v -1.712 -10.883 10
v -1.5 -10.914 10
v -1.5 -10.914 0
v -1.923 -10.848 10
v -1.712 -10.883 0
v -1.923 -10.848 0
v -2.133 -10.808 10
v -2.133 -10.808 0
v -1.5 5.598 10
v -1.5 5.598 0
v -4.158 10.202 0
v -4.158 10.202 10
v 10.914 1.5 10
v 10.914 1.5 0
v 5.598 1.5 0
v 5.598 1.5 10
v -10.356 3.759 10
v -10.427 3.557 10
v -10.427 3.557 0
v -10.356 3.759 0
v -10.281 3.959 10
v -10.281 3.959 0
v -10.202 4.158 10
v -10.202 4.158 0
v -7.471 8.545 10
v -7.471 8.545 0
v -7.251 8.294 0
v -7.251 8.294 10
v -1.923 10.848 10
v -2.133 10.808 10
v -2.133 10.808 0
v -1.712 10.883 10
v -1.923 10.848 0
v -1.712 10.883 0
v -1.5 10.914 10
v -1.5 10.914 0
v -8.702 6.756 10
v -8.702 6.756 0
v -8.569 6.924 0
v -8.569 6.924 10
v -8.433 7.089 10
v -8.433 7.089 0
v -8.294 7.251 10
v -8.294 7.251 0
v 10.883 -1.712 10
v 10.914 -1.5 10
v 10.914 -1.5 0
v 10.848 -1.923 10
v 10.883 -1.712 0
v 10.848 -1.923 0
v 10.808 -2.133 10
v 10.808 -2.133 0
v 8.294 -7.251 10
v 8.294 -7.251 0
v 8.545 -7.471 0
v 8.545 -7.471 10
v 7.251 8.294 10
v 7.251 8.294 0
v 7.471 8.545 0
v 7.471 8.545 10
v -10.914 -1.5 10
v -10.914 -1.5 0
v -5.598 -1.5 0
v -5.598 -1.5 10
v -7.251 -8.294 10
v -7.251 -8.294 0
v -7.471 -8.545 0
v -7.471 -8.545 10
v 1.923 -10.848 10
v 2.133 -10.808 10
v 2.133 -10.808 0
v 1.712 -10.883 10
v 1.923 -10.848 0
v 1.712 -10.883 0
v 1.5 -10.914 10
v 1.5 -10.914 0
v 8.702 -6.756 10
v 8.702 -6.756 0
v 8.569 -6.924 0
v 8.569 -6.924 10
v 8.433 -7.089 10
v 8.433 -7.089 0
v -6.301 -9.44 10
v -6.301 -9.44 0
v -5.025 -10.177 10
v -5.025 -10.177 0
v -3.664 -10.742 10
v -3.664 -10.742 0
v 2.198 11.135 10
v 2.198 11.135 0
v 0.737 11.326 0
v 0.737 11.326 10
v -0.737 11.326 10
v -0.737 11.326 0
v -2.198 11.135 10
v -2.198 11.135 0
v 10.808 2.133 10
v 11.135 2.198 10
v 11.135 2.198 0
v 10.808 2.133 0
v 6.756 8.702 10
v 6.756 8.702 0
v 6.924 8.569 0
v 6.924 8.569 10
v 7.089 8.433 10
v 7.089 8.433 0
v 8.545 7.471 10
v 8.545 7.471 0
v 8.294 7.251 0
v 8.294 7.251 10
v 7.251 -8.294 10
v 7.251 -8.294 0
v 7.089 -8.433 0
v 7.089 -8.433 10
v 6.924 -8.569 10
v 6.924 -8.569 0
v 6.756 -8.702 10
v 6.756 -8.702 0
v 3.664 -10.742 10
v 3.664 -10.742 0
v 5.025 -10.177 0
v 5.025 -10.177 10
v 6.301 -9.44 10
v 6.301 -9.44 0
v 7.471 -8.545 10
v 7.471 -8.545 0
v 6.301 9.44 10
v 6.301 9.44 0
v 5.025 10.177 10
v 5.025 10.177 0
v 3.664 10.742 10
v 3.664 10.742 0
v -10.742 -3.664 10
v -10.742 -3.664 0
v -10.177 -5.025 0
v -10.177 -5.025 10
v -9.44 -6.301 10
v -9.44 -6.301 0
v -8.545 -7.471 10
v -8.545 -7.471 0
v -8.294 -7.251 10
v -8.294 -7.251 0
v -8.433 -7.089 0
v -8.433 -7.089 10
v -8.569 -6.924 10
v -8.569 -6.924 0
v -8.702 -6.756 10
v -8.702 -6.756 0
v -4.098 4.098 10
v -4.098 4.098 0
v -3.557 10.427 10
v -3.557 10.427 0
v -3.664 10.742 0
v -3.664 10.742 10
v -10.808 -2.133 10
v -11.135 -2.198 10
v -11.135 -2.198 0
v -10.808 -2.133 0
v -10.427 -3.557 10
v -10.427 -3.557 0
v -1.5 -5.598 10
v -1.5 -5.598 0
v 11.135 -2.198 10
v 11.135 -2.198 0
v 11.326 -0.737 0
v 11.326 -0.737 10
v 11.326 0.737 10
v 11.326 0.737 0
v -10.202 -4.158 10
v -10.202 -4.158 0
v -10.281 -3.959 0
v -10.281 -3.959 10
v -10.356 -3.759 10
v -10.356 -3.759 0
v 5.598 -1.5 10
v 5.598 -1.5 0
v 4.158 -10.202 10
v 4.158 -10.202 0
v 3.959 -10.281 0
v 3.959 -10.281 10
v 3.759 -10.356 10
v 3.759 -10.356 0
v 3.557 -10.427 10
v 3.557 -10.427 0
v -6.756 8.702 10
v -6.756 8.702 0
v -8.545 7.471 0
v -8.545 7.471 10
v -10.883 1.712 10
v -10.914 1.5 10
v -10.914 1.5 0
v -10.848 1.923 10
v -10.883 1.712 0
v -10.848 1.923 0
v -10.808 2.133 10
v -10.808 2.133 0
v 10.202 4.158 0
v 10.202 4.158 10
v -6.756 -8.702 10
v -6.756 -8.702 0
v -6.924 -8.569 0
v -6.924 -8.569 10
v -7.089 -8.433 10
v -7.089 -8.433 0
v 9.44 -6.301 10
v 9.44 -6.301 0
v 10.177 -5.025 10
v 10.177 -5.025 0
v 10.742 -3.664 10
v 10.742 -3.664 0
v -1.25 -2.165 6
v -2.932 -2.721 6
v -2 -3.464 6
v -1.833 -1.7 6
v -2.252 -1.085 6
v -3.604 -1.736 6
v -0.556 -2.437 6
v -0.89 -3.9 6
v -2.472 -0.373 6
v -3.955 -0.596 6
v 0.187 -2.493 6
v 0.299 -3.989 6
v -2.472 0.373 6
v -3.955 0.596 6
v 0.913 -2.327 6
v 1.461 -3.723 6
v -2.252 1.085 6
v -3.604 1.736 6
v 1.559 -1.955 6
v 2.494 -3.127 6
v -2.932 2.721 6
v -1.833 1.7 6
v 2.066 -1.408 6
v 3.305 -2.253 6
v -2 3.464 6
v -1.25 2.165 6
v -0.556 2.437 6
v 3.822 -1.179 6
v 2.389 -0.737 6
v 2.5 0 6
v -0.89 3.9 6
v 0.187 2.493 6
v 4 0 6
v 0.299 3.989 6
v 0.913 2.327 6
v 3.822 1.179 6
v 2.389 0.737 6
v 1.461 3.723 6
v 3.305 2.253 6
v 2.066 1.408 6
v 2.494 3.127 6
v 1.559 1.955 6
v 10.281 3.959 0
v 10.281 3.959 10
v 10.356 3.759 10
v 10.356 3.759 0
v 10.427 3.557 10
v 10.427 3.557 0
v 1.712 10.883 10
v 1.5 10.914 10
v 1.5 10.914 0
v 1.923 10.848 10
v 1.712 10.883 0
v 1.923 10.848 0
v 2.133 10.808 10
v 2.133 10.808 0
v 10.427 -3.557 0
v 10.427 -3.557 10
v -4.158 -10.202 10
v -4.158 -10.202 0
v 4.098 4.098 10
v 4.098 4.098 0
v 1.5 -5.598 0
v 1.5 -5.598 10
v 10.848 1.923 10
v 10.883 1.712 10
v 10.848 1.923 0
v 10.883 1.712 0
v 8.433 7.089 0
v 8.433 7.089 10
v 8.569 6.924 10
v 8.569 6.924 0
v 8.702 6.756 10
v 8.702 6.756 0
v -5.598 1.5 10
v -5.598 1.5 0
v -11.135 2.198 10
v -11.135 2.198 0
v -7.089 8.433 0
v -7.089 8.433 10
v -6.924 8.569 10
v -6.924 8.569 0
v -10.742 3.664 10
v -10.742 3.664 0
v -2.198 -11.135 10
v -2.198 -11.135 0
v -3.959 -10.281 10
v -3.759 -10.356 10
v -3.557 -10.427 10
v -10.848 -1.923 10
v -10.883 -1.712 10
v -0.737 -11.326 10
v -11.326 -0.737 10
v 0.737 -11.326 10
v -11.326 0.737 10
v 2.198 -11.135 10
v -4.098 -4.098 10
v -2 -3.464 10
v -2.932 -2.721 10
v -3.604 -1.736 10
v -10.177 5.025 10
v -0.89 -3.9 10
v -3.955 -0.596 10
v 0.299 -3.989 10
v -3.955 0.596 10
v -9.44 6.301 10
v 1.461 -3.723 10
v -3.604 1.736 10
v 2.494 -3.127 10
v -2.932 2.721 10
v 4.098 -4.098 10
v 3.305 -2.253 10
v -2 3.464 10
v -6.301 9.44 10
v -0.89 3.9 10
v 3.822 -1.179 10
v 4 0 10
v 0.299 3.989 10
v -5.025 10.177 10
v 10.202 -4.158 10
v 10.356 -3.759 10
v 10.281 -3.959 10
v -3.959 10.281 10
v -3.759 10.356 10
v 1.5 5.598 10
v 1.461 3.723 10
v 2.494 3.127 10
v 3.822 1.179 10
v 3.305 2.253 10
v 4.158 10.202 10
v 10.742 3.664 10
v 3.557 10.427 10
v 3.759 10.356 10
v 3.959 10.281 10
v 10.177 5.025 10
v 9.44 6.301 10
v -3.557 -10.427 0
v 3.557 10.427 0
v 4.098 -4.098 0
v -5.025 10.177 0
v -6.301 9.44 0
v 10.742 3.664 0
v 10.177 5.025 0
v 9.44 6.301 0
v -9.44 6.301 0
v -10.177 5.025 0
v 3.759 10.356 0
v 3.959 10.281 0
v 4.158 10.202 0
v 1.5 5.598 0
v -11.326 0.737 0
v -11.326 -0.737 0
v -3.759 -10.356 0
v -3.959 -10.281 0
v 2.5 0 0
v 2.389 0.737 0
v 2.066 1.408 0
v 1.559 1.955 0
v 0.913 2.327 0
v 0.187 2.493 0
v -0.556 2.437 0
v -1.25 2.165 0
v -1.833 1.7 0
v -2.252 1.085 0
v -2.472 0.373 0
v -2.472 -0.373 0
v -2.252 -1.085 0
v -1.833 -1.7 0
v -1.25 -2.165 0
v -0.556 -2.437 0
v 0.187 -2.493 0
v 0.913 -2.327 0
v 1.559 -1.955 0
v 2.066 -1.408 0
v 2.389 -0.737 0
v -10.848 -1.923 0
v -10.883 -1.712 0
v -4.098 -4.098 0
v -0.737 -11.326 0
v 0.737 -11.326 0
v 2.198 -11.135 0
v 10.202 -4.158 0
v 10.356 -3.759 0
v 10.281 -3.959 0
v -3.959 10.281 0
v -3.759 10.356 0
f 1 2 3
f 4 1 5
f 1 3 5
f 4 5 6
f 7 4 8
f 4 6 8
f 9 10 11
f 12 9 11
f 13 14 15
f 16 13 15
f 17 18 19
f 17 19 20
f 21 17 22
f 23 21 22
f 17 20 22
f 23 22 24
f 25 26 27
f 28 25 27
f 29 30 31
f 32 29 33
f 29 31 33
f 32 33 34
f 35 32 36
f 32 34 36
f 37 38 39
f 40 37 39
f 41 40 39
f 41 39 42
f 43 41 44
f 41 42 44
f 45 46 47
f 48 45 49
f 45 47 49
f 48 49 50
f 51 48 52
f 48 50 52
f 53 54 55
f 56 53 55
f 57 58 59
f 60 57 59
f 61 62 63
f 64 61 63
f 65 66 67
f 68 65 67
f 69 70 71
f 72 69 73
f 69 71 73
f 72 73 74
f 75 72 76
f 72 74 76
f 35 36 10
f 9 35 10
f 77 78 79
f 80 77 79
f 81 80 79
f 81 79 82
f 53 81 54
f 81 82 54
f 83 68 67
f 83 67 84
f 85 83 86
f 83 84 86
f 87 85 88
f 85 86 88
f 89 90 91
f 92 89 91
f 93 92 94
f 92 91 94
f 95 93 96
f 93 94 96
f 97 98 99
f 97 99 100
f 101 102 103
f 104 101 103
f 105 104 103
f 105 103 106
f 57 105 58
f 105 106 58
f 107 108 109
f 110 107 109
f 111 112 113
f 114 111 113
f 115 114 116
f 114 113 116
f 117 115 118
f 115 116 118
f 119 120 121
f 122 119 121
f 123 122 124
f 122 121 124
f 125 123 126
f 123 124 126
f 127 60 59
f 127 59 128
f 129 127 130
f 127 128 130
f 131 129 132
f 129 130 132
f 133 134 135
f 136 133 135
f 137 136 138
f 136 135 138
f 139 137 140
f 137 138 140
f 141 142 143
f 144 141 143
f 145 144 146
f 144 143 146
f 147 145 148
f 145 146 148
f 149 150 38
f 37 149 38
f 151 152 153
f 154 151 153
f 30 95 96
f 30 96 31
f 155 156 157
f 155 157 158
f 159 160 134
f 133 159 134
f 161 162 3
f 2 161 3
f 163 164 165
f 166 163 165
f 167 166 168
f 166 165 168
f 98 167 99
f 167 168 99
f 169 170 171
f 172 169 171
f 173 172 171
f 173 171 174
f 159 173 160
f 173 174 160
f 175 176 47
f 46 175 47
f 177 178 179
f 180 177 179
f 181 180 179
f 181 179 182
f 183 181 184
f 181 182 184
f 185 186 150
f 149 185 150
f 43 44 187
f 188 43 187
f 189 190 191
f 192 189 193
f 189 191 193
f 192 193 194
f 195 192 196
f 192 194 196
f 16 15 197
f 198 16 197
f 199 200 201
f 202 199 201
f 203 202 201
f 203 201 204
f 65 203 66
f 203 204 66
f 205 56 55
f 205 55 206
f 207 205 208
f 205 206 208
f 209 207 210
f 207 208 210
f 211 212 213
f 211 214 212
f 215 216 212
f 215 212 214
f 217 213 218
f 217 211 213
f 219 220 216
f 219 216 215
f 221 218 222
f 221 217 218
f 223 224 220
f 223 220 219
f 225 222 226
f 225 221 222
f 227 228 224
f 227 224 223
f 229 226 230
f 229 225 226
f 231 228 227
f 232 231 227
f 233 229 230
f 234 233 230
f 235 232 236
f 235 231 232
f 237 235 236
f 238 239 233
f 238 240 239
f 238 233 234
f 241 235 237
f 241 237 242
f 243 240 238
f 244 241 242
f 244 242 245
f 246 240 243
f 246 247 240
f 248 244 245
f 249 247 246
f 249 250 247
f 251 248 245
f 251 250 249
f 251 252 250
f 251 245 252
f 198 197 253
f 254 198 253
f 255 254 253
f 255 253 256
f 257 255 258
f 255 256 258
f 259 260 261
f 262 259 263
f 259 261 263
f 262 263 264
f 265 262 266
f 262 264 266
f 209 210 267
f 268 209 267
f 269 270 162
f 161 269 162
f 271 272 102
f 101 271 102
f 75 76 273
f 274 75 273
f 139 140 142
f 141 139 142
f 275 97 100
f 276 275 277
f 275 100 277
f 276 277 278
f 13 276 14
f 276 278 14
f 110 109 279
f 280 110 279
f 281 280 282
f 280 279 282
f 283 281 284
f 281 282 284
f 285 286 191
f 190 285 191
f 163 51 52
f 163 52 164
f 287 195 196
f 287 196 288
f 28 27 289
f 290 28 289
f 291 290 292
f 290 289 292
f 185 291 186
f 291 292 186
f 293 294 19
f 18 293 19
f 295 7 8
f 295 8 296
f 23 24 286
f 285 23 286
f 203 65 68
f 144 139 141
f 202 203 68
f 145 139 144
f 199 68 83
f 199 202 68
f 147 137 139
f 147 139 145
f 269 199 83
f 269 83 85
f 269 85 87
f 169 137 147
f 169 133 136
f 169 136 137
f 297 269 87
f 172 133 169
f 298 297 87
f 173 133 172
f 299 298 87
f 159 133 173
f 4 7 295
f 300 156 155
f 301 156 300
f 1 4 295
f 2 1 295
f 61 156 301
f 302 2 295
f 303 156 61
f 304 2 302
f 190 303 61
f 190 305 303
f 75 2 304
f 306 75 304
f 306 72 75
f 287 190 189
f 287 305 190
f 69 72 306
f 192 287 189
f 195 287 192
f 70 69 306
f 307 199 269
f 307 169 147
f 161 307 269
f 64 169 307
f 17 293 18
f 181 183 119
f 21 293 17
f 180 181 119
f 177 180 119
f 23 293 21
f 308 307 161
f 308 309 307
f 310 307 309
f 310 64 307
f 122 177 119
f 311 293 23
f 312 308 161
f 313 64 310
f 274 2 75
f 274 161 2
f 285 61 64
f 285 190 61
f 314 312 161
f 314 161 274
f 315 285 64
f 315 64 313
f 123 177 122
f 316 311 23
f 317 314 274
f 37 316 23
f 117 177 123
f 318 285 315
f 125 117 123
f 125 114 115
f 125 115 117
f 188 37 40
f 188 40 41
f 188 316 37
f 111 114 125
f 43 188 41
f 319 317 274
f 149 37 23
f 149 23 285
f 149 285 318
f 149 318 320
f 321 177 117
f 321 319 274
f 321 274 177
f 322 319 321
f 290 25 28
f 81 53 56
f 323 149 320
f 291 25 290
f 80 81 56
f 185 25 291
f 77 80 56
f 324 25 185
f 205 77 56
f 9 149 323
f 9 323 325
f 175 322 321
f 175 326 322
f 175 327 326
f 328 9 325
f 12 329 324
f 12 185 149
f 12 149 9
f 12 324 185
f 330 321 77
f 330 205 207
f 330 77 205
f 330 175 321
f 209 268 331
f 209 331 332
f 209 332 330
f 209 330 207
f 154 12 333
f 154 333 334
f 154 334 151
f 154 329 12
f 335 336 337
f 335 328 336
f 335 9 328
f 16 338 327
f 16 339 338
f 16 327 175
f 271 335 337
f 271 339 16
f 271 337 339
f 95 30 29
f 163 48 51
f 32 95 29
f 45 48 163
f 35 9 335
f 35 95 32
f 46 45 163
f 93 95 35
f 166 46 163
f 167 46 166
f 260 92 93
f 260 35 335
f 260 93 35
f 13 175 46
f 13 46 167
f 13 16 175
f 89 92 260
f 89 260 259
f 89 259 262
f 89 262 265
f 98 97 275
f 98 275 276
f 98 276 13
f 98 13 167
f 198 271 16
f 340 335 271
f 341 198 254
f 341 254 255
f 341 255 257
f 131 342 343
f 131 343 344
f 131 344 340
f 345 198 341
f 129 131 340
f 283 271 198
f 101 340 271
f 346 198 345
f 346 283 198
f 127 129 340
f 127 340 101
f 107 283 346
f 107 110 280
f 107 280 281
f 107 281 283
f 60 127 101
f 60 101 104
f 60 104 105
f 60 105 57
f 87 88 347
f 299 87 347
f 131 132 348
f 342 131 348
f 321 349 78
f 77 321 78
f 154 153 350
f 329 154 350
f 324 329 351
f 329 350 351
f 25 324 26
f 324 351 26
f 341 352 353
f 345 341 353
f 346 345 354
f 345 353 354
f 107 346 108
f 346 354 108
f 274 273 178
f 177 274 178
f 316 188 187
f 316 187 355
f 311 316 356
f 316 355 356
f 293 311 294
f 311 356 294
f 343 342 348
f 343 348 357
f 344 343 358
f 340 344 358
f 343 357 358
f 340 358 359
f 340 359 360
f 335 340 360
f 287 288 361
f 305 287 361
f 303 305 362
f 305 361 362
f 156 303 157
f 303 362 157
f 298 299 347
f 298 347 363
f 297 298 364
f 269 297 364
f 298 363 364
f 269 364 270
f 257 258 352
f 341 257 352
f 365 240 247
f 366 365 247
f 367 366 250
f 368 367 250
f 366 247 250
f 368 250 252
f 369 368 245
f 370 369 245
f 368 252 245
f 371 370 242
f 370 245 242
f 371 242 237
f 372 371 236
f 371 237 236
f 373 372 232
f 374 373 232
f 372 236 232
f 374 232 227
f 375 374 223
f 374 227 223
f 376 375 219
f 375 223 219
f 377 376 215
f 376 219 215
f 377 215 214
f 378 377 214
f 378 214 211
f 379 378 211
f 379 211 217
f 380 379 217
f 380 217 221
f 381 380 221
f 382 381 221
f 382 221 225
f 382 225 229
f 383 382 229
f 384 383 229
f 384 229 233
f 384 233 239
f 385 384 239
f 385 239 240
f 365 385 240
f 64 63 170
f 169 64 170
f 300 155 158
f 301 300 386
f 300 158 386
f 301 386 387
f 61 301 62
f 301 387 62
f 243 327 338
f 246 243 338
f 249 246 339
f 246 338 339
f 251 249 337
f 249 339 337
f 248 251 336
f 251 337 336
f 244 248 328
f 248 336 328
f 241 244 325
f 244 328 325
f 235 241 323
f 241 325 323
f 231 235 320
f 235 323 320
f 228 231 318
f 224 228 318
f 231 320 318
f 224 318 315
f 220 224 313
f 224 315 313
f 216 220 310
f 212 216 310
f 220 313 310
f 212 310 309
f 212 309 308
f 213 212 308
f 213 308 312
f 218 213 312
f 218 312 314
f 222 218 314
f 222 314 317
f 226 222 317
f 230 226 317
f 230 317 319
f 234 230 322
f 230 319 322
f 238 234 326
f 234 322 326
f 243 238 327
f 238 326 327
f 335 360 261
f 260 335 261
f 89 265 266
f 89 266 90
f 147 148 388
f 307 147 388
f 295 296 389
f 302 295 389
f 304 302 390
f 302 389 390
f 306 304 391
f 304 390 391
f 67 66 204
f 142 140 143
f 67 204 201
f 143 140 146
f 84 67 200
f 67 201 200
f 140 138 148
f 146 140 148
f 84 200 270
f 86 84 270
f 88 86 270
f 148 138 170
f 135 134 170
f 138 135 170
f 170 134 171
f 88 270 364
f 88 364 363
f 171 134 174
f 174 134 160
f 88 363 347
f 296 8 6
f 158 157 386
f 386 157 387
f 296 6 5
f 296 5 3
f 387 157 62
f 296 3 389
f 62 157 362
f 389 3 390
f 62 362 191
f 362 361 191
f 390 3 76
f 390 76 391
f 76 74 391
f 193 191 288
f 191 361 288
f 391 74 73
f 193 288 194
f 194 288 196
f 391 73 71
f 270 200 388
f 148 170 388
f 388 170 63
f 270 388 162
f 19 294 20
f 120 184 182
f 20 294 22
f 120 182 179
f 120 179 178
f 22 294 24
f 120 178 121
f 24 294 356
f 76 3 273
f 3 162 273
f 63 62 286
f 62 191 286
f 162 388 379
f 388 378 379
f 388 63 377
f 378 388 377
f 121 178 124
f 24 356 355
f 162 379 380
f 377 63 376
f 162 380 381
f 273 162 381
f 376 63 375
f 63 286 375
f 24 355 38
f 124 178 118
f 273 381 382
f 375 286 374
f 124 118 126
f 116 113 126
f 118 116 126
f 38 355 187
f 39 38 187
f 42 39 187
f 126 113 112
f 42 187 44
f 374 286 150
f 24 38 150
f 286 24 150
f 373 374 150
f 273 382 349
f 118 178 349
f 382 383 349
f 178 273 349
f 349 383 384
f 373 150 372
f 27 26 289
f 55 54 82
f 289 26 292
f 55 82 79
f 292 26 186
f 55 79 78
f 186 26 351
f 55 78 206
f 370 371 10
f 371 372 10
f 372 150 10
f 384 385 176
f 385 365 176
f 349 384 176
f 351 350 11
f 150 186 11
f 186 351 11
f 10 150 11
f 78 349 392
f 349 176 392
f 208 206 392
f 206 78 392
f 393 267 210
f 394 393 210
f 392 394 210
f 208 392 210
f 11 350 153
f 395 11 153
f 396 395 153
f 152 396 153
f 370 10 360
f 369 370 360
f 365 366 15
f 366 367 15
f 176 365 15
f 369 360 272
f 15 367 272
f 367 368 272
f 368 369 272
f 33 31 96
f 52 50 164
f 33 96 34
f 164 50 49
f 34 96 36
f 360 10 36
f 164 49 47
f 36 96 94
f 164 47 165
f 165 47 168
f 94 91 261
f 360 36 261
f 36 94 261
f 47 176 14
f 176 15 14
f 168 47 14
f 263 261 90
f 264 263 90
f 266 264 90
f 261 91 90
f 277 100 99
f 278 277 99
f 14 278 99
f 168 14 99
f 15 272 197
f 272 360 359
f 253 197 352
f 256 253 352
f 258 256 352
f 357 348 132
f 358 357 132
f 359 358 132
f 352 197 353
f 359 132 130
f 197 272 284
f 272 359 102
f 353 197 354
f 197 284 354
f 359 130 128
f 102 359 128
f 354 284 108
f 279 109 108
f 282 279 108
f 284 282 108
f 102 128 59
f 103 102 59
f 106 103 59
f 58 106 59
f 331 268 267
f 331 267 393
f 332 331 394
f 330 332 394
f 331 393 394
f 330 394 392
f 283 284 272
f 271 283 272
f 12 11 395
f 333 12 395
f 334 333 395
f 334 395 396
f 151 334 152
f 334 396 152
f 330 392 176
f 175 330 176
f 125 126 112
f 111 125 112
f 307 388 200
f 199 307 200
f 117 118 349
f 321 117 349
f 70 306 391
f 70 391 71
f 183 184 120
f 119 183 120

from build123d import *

# Parameters (mm, degrees)
BOSS_EXTRUDE1_DEPTH = 10
SKETCH3_R           = 4
CUT_EXTRUDE1_DEPTH  = 4
SKETCH4_R           = 2.5
CUT_EXTRUDE2_DEPTH  = 10


with BuildPart() as part:
    # Sketch2 → Boss-Extrude1 (new body)
    with BuildSketch(Plane.XY):
        with BuildLine():
            Line((2.133108761, 10.808181691), (2.19765063, 11.135206855))
            ThreePointArc((2.19765063, 11.135206855), (0, 11.35), (-2.19765063, 11.135206855))
            Line((-2.19765063, 11.135206855), (-2.133108761, 10.808181691))
            ThreePointArc((-2.133108761, 10.808181691), (-1.817325769, 10.865738424), (-1.5, 10.914070939))
            Line((-1.5, 10.914070939), (-1.5, 5.598076211))
            Line((-1.5, 5.598076211), (-4.157997364, 10.201862691))
            ThreePointArc((-4.157997364, 10.201862691), (-3.859018929, 10.318668391), (-3.556764469, 10.426714294))
            Line((-3.556764469, 10.426714294), (-3.664382154, 10.742197328))
            ThreePointArc((-3.664382154, 10.742197328), (-5.675, 9.829388333), (-7.470824702, 8.544546698))
            Line((-7.470824702, 8.544546698), (-7.251417222, 8.293605533))
            ThreePointArc((-7.251417222, 8.293605533), (-7.006719495, 8.501342622), (-6.756073575, 8.701862691))
            Line((-6.756073575, 8.701862691), (-4.098076211, 4.098076211))
            Line((-4.098076211, 4.098076211), (-8.701862691, 6.756073575))
            ThreePointArc((-8.701862691, 6.756073575), (-8.501342622, 7.006719495), (-8.293605533, 7.251417222))
            Line((-8.293605533, 7.251417222), (-8.544546698, 7.470824702))
            ThreePointArc((-8.544546698, 7.470824702), (-9.829388333, 5.675), (-10.742197328, 3.664382154))
            Line((-10.742197328, 3.664382154), (-10.426714294, 3.556764469))
            ThreePointArc((-10.426714294, 3.556764469), (-10.318668391, 3.859018929), (-10.201862691, 4.157997364))
            Line((-10.201862691, 4.157997364), (-5.598076211, 1.5))
            Line((-5.598076211, 1.5), (-10.914070939, 1.5))
            ThreePointArc((-10.914070939, 1.5), (-10.865738424, 1.817325769), (-10.808181691, 2.133108761))
            Line((-10.808181691, 2.133108761), (-11.135206855, 2.19765063))
            ThreePointArc((-11.135206855, 2.19765063), (-11.35, 0), (-11.135206855, -2.19765063))
            Line((-11.135206855, -2.19765063), (-10.808181691, -2.133108761))
            ThreePointArc((-10.808181691, -2.133108761), (-10.865738424, -1.817325769), (-10.914070939, -1.5))
            Line((-10.914070939, -1.5), (-5.598076211, -1.5))
            Line((-5.598076211, -1.5), (-10.201862691, -4.157997364))
            ThreePointArc((-10.201862691, -4.157997364), (-10.318668391, -3.859018929), (-10.426714294, -3.556764469))
            Line((-10.426714294, -3.556764469), (-10.742197328, -3.664382154))
            ThreePointArc((-10.742197328, -3.664382154), (-9.829388333, -5.675), (-8.544546698, -7.470824702))
            Line((-8.544546698, -7.470824702), (-8.293605533, -7.251417222))
            ThreePointArc((-8.293605533, -7.251417222), (-8.501342622, -7.006719495), (-8.701862691, -6.756073575))
            Line((-8.701862691, -6.756073575), (-4.098076211, -4.098076211))
            Line((-4.098076211, -4.098076211), (-6.756073575, -8.701862691))
            ThreePointArc((-6.756073575, -8.701862691), (-7.006719495, -8.501342622), (-7.251417222, -8.293605533))
            Line((-7.251417222, -8.293605533), (-7.470824702, -8.544546698))
            ThreePointArc((-7.470824702, -8.544546698), (-5.675, -9.829388333), (-3.664382154, -10.742197328))
            Line((-3.664382154, -10.742197328), (-3.556764469, -10.426714294))
            ThreePointArc((-3.556764469, -10.426714294), (-3.859018929, -10.318668391), (-4.157997364, -10.201862691))
            Line((-4.157997364, -10.201862691), (-1.5, -5.598076211))
            Line((-1.5, -5.598076211), (-1.5, -10.914070939))
            ThreePointArc((-1.5, -10.914070939), (-1.817325769, -10.865738424), (-2.133108761, -10.808181691))
            Line((-2.133108761, -10.808181691), (-2.19765063, -11.135206855))
            ThreePointArc((-2.19765063, -11.135206855), (0, -11.35), (2.19765063, -11.135206855))
            Line((2.19765063, -11.135206855), (2.133108761, -10.808181691))
            ThreePointArc((2.133108761, -10.808181691), (1.817325769, -10.865738424), (1.5, -10.914070939))
            Line((1.5, -10.914070939), (1.5, -5.598076211))
            Line((1.5, -5.598076211), (4.157997364, -10.201862691))
            ThreePointArc((4.157997364, -10.201862691), (3.859018929, -10.318668391), (3.556764469, -10.426714294))
            Line((3.556764469, -10.426714294), (3.664382154, -10.742197328))
            ThreePointArc((3.664382154, -10.742197328), (5.675, -9.829388333), (7.470824702, -8.544546698))
            Line((7.470824702, -8.544546698), (7.251417222, -8.293605533))
            ThreePointArc((7.251417222, -8.293605533), (7.006719495, -8.501342622), (6.756073575, -8.701862691))
            Line((6.756073575, -8.701862691), (4.098076211, -4.098076211))
            Line((4.098076211, -4.098076211), (8.701862691, -6.756073575))
            ThreePointArc((8.701862691, -6.756073575), (8.501342622, -7.006719495), (8.293605533, -7.251417222))
            Line((8.293605533, -7.251417222), (8.544546698, -7.470824702))
            ThreePointArc((8.544546698, -7.470824702), (9.829388333, -5.675), (10.742197328, -3.664382154))
            Line((10.742197328, -3.664382154), (10.426714294, -3.556764469))
            ThreePointArc((10.426714294, -3.556764469), (10.318668391, -3.859018929), (10.201862691, -4.157997364))
            Line((10.201862691, -4.157997364), (5.598076211, -1.5))
            Line((5.598076211, -1.5), (10.914070939, -1.5))
            ThreePointArc((10.914070939, -1.5), (10.865738424, -1.817325769), (10.808181691, -2.133108761))
            Line((10.808181691, -2.133108761), (11.135206855, -2.19765063))
            ThreePointArc((11.135206855, -2.19765063), (11.35, 0), (11.135206855, 2.19765063))
            Line((11.135206855, 2.19765063), (10.808181691, 2.133108761))
            ThreePointArc((10.808181691, 2.133108761), (10.865738424, 1.817325769), (10.914070939, 1.5))
            Line((10.914070939, 1.5), (5.598076211, 1.5))
            Line((5.598076211, 1.5), (10.201862691, 4.157997364))
            ThreePointArc((10.201862691, 4.157997364), (10.318668391, 3.859018929), (10.426714294, 3.556764469))
            Line((10.426714294, 3.556764469), (10.742197328, 3.664382154))
            ThreePointArc((10.742197328, 3.664382154), (9.829388333, 5.675), (8.544546698, 7.470824702))
            Line((8.544546698, 7.470824702), (8.293605533, 7.251417222))
            ThreePointArc((8.293605533, 7.251417222), (8.501342622, 7.006719495), (8.701862691, 6.756073575))
            Line((8.701862691, 6.756073575), (4.098076211, 4.098076211))
            Line((4.098076211, 4.098076211), (6.756073575, 8.701862691))
            ThreePointArc((6.756073575, 8.701862691), (7.006719495, 8.501342622), (7.251417222, 8.293605533))
            Line((7.251417222, 8.293605533), (7.470824702, 8.544546698))
            ThreePointArc((7.470824702, 8.544546698), (5.675, 9.829388333), (3.664382154, 10.742197328))
            Line((3.664382154, 10.742197328), (3.556764469, 10.426714294))
            ThreePointArc((3.556764469, 10.426714294), (3.859018929, 10.318668391), (4.157997364, 10.201862691))
            Line((4.157997364, 10.201862691), (1.5, 5.598076211))
            Line((1.5, 5.598076211), (1.5, 10.914070939))
            ThreePointArc((1.5, 10.914070939), (1.817325769, 10.865738424), (2.133108761, 10.808181691))
        make_face()
    extrude(amount=BOSS_EXTRUDE1_DEPTH)

    # Sketch3 → Cut-Extrude1 (cut)
    with BuildSketch(Plane.XY.offset(10)):
        Circle(SKETCH3_R)
    extrude(amount=-CUT_EXTRUDE1_DEPTH, mode=Mode.SUBTRACT)

    # Sketch4 → Cut-Extrude2 (cut)
    with BuildSketch(Plane.XY.offset(6)):
        Circle(SKETCH4_R)
    extrude(amount=-CUT_EXTRUDE2_DEPTH, mode=Mode.SUBTRACT)


solid = part.part
